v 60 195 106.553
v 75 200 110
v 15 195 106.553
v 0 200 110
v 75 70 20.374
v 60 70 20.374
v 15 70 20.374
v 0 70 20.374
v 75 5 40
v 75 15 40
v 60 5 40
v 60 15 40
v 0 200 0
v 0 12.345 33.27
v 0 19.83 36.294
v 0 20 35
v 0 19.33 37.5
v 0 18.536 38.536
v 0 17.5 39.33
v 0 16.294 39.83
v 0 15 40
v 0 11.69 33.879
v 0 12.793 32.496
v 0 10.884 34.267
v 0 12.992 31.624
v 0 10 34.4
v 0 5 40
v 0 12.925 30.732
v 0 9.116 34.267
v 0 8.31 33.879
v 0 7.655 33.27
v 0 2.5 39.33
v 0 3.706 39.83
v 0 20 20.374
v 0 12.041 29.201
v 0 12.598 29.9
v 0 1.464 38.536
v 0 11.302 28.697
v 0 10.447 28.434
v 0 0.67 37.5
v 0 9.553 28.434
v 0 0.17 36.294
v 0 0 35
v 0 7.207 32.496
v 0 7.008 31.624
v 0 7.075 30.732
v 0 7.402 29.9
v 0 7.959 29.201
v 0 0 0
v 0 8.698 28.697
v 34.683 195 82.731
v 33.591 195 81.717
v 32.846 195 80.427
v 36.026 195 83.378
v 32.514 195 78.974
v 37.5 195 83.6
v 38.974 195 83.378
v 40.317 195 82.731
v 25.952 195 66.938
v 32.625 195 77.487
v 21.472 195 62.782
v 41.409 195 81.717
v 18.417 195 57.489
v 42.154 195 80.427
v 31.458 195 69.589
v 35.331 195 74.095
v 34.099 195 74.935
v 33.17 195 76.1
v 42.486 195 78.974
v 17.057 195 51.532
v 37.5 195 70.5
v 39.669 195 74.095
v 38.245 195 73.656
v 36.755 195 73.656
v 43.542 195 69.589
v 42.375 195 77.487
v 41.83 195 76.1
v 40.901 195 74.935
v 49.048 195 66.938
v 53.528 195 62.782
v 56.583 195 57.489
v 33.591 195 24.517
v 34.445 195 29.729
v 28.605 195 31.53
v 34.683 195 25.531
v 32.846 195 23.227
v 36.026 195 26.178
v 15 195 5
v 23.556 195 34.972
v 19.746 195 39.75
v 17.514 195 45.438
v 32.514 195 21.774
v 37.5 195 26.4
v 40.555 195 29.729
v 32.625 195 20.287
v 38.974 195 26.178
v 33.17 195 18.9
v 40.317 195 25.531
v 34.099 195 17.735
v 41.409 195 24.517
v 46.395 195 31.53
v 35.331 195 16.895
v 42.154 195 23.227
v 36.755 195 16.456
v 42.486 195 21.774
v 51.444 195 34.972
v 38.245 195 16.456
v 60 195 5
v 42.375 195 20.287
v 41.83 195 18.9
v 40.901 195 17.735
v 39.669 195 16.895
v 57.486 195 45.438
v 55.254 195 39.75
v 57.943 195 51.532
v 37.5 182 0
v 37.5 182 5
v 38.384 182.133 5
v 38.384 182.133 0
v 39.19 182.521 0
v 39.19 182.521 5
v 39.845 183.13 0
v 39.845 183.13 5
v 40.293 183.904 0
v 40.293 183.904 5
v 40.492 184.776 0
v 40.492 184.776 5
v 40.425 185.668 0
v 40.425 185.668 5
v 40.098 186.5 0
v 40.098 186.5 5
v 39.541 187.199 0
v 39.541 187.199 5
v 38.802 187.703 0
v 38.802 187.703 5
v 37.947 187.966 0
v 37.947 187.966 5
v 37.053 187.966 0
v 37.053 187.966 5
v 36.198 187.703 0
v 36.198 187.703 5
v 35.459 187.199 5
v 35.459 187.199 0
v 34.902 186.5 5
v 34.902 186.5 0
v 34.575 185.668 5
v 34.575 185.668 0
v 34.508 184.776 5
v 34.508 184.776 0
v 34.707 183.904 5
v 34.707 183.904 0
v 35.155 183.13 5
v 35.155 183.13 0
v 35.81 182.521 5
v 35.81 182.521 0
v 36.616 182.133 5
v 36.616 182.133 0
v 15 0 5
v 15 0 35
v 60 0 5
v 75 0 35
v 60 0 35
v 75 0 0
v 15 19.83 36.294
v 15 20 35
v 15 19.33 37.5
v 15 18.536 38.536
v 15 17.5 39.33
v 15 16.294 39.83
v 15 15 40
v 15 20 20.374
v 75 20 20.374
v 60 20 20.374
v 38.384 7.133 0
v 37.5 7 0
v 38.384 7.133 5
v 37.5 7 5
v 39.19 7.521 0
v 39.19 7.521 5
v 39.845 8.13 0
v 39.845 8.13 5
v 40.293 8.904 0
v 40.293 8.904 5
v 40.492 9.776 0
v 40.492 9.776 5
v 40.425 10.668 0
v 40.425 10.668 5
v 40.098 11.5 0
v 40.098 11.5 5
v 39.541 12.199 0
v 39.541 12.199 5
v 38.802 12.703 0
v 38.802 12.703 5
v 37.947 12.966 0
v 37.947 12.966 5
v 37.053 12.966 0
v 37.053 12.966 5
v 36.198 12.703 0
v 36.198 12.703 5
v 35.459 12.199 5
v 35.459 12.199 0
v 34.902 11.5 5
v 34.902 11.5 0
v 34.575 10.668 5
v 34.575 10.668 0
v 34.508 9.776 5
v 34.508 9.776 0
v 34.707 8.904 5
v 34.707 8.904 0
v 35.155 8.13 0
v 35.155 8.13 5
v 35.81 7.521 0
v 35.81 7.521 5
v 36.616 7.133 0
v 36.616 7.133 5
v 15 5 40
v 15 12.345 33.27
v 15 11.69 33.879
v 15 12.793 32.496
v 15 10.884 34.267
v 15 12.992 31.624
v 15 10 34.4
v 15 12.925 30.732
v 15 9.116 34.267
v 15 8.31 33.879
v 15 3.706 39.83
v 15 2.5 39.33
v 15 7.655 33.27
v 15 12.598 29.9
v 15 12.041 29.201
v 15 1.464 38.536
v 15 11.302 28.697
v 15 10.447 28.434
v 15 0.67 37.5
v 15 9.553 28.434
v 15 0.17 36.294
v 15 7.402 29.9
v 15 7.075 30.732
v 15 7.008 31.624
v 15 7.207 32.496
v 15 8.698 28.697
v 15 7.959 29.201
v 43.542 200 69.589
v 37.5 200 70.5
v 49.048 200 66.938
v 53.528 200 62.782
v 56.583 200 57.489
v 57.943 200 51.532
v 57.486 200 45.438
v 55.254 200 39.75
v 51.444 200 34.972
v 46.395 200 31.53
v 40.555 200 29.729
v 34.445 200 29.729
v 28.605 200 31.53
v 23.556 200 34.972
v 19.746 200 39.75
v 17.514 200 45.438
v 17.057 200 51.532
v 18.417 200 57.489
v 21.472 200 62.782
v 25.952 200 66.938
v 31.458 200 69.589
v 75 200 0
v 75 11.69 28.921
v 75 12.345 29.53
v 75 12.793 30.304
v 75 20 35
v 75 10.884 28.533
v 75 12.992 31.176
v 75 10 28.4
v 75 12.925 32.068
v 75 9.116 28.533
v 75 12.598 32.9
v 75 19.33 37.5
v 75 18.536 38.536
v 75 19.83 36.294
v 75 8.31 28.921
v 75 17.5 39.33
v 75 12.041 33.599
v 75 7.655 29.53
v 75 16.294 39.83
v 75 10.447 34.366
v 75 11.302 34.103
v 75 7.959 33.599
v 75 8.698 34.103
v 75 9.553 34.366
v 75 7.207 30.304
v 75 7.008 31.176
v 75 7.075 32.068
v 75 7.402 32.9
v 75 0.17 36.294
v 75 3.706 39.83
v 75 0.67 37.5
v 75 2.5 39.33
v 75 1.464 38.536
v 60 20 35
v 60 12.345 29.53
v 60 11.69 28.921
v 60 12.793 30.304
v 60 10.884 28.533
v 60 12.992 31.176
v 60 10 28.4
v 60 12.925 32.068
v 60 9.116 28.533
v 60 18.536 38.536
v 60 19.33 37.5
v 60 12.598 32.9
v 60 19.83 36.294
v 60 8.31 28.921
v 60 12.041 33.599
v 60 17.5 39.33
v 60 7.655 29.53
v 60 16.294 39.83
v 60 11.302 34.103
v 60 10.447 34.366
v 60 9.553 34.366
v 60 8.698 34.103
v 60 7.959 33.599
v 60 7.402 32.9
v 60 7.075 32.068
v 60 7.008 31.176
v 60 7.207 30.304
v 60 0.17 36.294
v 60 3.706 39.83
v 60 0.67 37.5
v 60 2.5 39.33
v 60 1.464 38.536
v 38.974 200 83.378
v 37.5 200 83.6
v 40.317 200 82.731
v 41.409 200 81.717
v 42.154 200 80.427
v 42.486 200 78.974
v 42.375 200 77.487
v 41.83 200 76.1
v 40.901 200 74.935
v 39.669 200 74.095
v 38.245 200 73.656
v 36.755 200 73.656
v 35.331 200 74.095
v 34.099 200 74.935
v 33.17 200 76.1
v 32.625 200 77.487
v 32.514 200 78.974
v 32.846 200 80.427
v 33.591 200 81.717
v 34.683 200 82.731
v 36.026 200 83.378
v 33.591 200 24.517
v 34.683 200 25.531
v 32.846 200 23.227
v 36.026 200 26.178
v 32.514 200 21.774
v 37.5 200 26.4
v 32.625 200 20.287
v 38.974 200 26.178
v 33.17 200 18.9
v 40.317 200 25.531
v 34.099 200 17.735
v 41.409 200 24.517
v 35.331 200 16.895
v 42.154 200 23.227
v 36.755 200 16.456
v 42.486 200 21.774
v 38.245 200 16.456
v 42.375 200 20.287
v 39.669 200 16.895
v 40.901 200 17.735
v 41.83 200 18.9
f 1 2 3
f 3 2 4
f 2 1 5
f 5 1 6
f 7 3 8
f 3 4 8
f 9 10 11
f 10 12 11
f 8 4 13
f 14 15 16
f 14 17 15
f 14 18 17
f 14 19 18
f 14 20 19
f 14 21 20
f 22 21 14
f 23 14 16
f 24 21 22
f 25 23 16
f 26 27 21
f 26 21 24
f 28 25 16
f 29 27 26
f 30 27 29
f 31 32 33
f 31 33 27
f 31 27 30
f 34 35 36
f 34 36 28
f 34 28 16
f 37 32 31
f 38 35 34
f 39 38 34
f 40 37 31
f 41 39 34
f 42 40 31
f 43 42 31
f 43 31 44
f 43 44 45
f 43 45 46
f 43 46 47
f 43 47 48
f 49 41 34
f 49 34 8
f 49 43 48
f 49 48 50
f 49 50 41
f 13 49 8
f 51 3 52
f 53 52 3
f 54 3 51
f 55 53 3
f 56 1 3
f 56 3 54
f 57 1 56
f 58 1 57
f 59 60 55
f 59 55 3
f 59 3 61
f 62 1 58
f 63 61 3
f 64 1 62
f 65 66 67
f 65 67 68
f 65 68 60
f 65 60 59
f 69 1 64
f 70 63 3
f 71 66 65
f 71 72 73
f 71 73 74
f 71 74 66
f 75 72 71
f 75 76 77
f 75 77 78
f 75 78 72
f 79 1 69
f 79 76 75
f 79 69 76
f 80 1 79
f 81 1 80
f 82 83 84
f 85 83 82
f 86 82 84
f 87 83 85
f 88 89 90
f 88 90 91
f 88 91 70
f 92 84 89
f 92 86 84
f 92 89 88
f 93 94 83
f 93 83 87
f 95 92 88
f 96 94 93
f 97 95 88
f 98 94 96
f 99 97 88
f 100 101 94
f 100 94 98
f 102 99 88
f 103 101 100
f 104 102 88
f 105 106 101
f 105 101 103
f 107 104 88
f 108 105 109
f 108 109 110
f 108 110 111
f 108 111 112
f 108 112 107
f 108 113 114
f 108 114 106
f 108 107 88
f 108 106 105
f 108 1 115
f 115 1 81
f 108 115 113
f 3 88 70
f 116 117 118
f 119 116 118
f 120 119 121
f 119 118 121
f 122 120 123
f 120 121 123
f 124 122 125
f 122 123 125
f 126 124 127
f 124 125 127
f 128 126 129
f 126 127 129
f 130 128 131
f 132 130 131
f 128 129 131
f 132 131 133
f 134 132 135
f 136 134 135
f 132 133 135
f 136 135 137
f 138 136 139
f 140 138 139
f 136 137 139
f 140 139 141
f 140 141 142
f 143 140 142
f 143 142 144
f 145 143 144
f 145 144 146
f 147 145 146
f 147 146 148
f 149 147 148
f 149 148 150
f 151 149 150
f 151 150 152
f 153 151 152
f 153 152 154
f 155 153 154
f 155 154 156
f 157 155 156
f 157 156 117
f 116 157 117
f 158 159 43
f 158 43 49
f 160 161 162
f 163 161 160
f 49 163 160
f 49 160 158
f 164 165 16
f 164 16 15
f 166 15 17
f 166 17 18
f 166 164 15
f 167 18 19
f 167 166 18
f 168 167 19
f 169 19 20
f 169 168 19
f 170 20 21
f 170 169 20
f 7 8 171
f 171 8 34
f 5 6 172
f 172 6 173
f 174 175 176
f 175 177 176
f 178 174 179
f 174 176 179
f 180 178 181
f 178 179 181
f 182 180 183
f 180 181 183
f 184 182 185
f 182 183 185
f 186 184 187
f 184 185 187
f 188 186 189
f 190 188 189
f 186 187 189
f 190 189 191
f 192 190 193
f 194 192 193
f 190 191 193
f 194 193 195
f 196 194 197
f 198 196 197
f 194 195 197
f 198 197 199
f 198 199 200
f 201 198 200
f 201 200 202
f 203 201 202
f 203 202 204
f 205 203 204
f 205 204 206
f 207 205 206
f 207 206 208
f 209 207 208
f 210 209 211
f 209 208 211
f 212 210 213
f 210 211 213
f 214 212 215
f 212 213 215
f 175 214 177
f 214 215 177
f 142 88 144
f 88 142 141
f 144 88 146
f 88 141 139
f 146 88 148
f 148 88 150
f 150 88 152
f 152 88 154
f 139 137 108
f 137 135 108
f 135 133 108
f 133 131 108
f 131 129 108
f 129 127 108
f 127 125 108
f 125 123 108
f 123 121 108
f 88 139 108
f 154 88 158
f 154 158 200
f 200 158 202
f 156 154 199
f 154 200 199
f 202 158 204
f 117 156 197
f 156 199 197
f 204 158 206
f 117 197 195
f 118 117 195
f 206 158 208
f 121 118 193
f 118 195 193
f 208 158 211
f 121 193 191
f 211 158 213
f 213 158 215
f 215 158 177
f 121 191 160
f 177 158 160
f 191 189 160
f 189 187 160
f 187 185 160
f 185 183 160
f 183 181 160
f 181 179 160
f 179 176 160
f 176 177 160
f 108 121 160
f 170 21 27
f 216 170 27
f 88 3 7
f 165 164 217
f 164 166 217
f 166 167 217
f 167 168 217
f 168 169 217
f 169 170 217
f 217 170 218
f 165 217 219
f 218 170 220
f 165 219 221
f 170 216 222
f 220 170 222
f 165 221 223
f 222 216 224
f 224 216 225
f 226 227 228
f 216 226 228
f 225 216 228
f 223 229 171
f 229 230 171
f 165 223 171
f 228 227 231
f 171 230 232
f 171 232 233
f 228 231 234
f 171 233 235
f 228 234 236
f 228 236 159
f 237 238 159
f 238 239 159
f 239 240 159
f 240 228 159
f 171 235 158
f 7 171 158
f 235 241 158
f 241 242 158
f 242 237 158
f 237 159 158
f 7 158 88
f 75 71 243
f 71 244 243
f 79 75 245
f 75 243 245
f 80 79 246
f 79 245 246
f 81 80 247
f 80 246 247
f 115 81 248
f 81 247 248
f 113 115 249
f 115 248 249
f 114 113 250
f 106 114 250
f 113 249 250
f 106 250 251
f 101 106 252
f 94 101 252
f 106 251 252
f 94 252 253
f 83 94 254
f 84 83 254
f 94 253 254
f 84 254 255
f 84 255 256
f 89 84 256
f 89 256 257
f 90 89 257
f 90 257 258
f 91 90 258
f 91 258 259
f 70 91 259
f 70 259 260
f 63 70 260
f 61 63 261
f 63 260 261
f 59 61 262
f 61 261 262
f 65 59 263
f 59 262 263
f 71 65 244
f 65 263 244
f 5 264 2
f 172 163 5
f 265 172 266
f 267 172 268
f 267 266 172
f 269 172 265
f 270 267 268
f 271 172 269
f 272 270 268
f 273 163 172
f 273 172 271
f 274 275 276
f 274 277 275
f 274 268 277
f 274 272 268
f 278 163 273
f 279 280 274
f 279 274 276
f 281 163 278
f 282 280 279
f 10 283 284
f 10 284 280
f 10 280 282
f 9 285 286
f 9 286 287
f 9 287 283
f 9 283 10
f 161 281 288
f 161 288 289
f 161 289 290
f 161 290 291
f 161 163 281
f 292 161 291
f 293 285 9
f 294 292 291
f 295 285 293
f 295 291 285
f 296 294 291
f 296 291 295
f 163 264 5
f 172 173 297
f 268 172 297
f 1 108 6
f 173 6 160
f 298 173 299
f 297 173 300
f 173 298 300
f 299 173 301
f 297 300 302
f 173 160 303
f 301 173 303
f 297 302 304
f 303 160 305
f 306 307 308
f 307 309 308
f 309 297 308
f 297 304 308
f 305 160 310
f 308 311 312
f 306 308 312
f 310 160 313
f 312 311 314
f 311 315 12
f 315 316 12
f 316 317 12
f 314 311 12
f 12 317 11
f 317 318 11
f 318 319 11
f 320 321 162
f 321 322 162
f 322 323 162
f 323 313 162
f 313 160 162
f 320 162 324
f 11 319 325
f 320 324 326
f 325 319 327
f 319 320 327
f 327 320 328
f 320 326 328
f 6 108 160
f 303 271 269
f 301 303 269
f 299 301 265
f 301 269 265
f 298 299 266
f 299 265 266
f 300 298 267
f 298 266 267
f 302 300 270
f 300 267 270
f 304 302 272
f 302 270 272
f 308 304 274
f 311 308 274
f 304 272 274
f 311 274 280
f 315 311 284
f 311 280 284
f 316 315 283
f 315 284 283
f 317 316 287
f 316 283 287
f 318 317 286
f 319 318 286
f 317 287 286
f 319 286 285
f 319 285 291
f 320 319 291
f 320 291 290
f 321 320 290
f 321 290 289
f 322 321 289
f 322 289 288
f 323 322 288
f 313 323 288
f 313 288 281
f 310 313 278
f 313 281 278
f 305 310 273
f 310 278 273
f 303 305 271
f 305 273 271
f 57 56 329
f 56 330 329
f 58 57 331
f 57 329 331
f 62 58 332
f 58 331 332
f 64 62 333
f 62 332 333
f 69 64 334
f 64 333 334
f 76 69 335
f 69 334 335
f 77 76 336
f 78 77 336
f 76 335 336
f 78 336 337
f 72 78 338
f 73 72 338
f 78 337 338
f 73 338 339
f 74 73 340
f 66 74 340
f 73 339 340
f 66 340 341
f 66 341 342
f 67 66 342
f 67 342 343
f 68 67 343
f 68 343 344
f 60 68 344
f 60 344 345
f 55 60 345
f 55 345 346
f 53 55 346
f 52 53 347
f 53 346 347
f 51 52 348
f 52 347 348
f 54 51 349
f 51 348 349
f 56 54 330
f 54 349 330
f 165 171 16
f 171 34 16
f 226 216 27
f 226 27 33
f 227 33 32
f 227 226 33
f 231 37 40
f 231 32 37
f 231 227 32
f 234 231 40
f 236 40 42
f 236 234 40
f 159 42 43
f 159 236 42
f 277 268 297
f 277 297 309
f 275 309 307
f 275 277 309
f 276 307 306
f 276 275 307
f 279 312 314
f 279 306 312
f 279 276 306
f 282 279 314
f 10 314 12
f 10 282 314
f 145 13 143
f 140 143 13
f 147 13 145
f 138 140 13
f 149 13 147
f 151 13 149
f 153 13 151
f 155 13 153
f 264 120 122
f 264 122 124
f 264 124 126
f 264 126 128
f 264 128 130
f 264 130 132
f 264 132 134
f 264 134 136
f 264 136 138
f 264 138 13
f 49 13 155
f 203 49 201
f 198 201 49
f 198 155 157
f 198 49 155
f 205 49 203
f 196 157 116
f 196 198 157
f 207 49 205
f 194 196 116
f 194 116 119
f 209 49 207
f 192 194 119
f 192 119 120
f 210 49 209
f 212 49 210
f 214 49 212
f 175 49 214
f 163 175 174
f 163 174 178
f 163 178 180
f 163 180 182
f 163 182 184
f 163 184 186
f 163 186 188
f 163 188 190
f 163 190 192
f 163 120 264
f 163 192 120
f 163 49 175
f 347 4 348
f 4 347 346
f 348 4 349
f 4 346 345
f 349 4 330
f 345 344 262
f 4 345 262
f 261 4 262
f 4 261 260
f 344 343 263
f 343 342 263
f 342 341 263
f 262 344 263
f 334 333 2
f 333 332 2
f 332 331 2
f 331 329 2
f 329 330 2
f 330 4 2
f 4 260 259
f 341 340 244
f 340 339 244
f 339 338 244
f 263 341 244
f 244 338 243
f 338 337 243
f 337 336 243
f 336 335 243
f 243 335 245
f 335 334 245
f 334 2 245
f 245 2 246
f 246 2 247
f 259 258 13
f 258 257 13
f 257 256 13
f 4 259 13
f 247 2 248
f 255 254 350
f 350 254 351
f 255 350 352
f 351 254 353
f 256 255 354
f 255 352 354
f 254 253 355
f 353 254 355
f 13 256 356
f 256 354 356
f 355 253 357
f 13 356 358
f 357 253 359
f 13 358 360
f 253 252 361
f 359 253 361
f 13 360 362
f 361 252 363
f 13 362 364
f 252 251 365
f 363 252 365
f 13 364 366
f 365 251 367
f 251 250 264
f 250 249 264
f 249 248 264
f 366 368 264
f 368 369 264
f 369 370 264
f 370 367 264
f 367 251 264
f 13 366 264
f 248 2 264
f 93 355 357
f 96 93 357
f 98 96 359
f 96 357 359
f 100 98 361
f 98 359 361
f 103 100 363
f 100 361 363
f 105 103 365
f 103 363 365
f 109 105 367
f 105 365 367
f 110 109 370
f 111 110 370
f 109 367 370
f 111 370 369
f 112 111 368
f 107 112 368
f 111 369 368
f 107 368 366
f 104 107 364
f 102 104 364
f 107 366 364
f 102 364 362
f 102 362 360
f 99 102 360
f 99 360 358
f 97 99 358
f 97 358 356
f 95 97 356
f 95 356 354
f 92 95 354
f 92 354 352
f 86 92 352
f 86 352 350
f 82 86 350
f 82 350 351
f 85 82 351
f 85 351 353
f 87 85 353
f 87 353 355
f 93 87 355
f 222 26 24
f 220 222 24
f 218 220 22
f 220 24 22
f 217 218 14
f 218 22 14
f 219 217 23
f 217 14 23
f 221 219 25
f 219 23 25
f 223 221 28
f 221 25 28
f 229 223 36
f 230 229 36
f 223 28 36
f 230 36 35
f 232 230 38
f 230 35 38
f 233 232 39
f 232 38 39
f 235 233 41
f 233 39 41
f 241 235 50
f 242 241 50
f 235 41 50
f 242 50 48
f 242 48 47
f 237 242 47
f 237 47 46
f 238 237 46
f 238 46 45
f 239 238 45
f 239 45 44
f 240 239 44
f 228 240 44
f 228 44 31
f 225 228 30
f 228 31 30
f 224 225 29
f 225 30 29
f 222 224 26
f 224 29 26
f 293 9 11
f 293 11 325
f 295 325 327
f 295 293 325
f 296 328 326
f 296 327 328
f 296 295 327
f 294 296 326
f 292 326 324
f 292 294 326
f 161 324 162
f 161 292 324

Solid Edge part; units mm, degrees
sketch "Sketch1" plane through (0, 0, 0) normal (0, -1, 0) x (1, 0, 0)
  line L0 (0, 110) -> (0, 0)
  line L1 (0, 0) -> (75, 0)
  line L2 (75, 0) -> (75, 110)
  line L3 (75, 110) -> (0, 110)
  dimension "D1" = 75
  dimension "D2" = 110
extrude "Protrusion1" add sketch "Sketch1" against normal blind 200
sketch "Sketch2" plane through (37.5, 0, 62.5) normal (0, -1, 0) x (1, 0, 0)
  line L0 (-22.5, 47.5) -> (-22.5, -57.5)
  line L1 (-22.5, -57.5) -> (22.5, -57.5)
  line L2 (22.5, -57.5) -> (22.5, 47.5)
  dimension "D1" = 45
  dimension "D2" = 5
  dimension "D3" = 15
extrude "ExtrudedCutout_1" cut sketch "Sketch2" against normal blind 195 material side at (15.05, 0, 57.5)
sketch "Sketch3" plane through (0, 100, 62.5) normal (-1, 0, 0) x (0, -1, 0)
  line L0 (-100, 47.5) -> (30, -42.1258)
  line L1 (30, -42.1258) -> (80, -42.1258)
  line L2 (80, -42.1258) -> (80, -22.5)
  line L3 (80, -22.5) -> (100, -22.5)
  line L4 (100, 47.5) -> (100, -22.5)
  line L5 (-100, 47.5) -> (100, 47.5)
  dimension "D1" = 40
  dimension "D2" = 20
  dimension "D3" = 50
  dimension "D4" = 157.9012
extrude "ExtrudedCutout_2" cut sketch "Sketch3" against normal blind 140
hole "hål_till_pedal_vänster" at (0, 10, 31.4) direction (1, 0, 0) diameter 6 end up to next
hole "Hål_till_pedal_höger_" at (75, 10, 31.4) direction (-1, 0, 0) diameter 6 end up to next
fillet "Avrundning" radius 5 4 edges at (67.5, 0, 40) (67.5, 20, 40) (7.5, 0, 40) (7.5, 20, 40)
hole "Hål_till_huvudcylinder" at (37.5, 200, 50) direction (0, -1, 0) diameter 41 end up to next
hole "Hole1" at (37.5, 200, 78.6) direction (0, -1, 0) diameter 10 end up to next
hole "Hole2" at (37.5, 200, 21.4) direction (0, -1, 0) diameter 10 end up to next
hole "Hole3" at (37.5, 10, 5) direction (0, 0, -1) diameter 6 end through all
hole "Hole4" at (37.5, 185, 5) direction (0, 0, -1) diameter 6 end through all
properties material "Aluminum, 1060"
